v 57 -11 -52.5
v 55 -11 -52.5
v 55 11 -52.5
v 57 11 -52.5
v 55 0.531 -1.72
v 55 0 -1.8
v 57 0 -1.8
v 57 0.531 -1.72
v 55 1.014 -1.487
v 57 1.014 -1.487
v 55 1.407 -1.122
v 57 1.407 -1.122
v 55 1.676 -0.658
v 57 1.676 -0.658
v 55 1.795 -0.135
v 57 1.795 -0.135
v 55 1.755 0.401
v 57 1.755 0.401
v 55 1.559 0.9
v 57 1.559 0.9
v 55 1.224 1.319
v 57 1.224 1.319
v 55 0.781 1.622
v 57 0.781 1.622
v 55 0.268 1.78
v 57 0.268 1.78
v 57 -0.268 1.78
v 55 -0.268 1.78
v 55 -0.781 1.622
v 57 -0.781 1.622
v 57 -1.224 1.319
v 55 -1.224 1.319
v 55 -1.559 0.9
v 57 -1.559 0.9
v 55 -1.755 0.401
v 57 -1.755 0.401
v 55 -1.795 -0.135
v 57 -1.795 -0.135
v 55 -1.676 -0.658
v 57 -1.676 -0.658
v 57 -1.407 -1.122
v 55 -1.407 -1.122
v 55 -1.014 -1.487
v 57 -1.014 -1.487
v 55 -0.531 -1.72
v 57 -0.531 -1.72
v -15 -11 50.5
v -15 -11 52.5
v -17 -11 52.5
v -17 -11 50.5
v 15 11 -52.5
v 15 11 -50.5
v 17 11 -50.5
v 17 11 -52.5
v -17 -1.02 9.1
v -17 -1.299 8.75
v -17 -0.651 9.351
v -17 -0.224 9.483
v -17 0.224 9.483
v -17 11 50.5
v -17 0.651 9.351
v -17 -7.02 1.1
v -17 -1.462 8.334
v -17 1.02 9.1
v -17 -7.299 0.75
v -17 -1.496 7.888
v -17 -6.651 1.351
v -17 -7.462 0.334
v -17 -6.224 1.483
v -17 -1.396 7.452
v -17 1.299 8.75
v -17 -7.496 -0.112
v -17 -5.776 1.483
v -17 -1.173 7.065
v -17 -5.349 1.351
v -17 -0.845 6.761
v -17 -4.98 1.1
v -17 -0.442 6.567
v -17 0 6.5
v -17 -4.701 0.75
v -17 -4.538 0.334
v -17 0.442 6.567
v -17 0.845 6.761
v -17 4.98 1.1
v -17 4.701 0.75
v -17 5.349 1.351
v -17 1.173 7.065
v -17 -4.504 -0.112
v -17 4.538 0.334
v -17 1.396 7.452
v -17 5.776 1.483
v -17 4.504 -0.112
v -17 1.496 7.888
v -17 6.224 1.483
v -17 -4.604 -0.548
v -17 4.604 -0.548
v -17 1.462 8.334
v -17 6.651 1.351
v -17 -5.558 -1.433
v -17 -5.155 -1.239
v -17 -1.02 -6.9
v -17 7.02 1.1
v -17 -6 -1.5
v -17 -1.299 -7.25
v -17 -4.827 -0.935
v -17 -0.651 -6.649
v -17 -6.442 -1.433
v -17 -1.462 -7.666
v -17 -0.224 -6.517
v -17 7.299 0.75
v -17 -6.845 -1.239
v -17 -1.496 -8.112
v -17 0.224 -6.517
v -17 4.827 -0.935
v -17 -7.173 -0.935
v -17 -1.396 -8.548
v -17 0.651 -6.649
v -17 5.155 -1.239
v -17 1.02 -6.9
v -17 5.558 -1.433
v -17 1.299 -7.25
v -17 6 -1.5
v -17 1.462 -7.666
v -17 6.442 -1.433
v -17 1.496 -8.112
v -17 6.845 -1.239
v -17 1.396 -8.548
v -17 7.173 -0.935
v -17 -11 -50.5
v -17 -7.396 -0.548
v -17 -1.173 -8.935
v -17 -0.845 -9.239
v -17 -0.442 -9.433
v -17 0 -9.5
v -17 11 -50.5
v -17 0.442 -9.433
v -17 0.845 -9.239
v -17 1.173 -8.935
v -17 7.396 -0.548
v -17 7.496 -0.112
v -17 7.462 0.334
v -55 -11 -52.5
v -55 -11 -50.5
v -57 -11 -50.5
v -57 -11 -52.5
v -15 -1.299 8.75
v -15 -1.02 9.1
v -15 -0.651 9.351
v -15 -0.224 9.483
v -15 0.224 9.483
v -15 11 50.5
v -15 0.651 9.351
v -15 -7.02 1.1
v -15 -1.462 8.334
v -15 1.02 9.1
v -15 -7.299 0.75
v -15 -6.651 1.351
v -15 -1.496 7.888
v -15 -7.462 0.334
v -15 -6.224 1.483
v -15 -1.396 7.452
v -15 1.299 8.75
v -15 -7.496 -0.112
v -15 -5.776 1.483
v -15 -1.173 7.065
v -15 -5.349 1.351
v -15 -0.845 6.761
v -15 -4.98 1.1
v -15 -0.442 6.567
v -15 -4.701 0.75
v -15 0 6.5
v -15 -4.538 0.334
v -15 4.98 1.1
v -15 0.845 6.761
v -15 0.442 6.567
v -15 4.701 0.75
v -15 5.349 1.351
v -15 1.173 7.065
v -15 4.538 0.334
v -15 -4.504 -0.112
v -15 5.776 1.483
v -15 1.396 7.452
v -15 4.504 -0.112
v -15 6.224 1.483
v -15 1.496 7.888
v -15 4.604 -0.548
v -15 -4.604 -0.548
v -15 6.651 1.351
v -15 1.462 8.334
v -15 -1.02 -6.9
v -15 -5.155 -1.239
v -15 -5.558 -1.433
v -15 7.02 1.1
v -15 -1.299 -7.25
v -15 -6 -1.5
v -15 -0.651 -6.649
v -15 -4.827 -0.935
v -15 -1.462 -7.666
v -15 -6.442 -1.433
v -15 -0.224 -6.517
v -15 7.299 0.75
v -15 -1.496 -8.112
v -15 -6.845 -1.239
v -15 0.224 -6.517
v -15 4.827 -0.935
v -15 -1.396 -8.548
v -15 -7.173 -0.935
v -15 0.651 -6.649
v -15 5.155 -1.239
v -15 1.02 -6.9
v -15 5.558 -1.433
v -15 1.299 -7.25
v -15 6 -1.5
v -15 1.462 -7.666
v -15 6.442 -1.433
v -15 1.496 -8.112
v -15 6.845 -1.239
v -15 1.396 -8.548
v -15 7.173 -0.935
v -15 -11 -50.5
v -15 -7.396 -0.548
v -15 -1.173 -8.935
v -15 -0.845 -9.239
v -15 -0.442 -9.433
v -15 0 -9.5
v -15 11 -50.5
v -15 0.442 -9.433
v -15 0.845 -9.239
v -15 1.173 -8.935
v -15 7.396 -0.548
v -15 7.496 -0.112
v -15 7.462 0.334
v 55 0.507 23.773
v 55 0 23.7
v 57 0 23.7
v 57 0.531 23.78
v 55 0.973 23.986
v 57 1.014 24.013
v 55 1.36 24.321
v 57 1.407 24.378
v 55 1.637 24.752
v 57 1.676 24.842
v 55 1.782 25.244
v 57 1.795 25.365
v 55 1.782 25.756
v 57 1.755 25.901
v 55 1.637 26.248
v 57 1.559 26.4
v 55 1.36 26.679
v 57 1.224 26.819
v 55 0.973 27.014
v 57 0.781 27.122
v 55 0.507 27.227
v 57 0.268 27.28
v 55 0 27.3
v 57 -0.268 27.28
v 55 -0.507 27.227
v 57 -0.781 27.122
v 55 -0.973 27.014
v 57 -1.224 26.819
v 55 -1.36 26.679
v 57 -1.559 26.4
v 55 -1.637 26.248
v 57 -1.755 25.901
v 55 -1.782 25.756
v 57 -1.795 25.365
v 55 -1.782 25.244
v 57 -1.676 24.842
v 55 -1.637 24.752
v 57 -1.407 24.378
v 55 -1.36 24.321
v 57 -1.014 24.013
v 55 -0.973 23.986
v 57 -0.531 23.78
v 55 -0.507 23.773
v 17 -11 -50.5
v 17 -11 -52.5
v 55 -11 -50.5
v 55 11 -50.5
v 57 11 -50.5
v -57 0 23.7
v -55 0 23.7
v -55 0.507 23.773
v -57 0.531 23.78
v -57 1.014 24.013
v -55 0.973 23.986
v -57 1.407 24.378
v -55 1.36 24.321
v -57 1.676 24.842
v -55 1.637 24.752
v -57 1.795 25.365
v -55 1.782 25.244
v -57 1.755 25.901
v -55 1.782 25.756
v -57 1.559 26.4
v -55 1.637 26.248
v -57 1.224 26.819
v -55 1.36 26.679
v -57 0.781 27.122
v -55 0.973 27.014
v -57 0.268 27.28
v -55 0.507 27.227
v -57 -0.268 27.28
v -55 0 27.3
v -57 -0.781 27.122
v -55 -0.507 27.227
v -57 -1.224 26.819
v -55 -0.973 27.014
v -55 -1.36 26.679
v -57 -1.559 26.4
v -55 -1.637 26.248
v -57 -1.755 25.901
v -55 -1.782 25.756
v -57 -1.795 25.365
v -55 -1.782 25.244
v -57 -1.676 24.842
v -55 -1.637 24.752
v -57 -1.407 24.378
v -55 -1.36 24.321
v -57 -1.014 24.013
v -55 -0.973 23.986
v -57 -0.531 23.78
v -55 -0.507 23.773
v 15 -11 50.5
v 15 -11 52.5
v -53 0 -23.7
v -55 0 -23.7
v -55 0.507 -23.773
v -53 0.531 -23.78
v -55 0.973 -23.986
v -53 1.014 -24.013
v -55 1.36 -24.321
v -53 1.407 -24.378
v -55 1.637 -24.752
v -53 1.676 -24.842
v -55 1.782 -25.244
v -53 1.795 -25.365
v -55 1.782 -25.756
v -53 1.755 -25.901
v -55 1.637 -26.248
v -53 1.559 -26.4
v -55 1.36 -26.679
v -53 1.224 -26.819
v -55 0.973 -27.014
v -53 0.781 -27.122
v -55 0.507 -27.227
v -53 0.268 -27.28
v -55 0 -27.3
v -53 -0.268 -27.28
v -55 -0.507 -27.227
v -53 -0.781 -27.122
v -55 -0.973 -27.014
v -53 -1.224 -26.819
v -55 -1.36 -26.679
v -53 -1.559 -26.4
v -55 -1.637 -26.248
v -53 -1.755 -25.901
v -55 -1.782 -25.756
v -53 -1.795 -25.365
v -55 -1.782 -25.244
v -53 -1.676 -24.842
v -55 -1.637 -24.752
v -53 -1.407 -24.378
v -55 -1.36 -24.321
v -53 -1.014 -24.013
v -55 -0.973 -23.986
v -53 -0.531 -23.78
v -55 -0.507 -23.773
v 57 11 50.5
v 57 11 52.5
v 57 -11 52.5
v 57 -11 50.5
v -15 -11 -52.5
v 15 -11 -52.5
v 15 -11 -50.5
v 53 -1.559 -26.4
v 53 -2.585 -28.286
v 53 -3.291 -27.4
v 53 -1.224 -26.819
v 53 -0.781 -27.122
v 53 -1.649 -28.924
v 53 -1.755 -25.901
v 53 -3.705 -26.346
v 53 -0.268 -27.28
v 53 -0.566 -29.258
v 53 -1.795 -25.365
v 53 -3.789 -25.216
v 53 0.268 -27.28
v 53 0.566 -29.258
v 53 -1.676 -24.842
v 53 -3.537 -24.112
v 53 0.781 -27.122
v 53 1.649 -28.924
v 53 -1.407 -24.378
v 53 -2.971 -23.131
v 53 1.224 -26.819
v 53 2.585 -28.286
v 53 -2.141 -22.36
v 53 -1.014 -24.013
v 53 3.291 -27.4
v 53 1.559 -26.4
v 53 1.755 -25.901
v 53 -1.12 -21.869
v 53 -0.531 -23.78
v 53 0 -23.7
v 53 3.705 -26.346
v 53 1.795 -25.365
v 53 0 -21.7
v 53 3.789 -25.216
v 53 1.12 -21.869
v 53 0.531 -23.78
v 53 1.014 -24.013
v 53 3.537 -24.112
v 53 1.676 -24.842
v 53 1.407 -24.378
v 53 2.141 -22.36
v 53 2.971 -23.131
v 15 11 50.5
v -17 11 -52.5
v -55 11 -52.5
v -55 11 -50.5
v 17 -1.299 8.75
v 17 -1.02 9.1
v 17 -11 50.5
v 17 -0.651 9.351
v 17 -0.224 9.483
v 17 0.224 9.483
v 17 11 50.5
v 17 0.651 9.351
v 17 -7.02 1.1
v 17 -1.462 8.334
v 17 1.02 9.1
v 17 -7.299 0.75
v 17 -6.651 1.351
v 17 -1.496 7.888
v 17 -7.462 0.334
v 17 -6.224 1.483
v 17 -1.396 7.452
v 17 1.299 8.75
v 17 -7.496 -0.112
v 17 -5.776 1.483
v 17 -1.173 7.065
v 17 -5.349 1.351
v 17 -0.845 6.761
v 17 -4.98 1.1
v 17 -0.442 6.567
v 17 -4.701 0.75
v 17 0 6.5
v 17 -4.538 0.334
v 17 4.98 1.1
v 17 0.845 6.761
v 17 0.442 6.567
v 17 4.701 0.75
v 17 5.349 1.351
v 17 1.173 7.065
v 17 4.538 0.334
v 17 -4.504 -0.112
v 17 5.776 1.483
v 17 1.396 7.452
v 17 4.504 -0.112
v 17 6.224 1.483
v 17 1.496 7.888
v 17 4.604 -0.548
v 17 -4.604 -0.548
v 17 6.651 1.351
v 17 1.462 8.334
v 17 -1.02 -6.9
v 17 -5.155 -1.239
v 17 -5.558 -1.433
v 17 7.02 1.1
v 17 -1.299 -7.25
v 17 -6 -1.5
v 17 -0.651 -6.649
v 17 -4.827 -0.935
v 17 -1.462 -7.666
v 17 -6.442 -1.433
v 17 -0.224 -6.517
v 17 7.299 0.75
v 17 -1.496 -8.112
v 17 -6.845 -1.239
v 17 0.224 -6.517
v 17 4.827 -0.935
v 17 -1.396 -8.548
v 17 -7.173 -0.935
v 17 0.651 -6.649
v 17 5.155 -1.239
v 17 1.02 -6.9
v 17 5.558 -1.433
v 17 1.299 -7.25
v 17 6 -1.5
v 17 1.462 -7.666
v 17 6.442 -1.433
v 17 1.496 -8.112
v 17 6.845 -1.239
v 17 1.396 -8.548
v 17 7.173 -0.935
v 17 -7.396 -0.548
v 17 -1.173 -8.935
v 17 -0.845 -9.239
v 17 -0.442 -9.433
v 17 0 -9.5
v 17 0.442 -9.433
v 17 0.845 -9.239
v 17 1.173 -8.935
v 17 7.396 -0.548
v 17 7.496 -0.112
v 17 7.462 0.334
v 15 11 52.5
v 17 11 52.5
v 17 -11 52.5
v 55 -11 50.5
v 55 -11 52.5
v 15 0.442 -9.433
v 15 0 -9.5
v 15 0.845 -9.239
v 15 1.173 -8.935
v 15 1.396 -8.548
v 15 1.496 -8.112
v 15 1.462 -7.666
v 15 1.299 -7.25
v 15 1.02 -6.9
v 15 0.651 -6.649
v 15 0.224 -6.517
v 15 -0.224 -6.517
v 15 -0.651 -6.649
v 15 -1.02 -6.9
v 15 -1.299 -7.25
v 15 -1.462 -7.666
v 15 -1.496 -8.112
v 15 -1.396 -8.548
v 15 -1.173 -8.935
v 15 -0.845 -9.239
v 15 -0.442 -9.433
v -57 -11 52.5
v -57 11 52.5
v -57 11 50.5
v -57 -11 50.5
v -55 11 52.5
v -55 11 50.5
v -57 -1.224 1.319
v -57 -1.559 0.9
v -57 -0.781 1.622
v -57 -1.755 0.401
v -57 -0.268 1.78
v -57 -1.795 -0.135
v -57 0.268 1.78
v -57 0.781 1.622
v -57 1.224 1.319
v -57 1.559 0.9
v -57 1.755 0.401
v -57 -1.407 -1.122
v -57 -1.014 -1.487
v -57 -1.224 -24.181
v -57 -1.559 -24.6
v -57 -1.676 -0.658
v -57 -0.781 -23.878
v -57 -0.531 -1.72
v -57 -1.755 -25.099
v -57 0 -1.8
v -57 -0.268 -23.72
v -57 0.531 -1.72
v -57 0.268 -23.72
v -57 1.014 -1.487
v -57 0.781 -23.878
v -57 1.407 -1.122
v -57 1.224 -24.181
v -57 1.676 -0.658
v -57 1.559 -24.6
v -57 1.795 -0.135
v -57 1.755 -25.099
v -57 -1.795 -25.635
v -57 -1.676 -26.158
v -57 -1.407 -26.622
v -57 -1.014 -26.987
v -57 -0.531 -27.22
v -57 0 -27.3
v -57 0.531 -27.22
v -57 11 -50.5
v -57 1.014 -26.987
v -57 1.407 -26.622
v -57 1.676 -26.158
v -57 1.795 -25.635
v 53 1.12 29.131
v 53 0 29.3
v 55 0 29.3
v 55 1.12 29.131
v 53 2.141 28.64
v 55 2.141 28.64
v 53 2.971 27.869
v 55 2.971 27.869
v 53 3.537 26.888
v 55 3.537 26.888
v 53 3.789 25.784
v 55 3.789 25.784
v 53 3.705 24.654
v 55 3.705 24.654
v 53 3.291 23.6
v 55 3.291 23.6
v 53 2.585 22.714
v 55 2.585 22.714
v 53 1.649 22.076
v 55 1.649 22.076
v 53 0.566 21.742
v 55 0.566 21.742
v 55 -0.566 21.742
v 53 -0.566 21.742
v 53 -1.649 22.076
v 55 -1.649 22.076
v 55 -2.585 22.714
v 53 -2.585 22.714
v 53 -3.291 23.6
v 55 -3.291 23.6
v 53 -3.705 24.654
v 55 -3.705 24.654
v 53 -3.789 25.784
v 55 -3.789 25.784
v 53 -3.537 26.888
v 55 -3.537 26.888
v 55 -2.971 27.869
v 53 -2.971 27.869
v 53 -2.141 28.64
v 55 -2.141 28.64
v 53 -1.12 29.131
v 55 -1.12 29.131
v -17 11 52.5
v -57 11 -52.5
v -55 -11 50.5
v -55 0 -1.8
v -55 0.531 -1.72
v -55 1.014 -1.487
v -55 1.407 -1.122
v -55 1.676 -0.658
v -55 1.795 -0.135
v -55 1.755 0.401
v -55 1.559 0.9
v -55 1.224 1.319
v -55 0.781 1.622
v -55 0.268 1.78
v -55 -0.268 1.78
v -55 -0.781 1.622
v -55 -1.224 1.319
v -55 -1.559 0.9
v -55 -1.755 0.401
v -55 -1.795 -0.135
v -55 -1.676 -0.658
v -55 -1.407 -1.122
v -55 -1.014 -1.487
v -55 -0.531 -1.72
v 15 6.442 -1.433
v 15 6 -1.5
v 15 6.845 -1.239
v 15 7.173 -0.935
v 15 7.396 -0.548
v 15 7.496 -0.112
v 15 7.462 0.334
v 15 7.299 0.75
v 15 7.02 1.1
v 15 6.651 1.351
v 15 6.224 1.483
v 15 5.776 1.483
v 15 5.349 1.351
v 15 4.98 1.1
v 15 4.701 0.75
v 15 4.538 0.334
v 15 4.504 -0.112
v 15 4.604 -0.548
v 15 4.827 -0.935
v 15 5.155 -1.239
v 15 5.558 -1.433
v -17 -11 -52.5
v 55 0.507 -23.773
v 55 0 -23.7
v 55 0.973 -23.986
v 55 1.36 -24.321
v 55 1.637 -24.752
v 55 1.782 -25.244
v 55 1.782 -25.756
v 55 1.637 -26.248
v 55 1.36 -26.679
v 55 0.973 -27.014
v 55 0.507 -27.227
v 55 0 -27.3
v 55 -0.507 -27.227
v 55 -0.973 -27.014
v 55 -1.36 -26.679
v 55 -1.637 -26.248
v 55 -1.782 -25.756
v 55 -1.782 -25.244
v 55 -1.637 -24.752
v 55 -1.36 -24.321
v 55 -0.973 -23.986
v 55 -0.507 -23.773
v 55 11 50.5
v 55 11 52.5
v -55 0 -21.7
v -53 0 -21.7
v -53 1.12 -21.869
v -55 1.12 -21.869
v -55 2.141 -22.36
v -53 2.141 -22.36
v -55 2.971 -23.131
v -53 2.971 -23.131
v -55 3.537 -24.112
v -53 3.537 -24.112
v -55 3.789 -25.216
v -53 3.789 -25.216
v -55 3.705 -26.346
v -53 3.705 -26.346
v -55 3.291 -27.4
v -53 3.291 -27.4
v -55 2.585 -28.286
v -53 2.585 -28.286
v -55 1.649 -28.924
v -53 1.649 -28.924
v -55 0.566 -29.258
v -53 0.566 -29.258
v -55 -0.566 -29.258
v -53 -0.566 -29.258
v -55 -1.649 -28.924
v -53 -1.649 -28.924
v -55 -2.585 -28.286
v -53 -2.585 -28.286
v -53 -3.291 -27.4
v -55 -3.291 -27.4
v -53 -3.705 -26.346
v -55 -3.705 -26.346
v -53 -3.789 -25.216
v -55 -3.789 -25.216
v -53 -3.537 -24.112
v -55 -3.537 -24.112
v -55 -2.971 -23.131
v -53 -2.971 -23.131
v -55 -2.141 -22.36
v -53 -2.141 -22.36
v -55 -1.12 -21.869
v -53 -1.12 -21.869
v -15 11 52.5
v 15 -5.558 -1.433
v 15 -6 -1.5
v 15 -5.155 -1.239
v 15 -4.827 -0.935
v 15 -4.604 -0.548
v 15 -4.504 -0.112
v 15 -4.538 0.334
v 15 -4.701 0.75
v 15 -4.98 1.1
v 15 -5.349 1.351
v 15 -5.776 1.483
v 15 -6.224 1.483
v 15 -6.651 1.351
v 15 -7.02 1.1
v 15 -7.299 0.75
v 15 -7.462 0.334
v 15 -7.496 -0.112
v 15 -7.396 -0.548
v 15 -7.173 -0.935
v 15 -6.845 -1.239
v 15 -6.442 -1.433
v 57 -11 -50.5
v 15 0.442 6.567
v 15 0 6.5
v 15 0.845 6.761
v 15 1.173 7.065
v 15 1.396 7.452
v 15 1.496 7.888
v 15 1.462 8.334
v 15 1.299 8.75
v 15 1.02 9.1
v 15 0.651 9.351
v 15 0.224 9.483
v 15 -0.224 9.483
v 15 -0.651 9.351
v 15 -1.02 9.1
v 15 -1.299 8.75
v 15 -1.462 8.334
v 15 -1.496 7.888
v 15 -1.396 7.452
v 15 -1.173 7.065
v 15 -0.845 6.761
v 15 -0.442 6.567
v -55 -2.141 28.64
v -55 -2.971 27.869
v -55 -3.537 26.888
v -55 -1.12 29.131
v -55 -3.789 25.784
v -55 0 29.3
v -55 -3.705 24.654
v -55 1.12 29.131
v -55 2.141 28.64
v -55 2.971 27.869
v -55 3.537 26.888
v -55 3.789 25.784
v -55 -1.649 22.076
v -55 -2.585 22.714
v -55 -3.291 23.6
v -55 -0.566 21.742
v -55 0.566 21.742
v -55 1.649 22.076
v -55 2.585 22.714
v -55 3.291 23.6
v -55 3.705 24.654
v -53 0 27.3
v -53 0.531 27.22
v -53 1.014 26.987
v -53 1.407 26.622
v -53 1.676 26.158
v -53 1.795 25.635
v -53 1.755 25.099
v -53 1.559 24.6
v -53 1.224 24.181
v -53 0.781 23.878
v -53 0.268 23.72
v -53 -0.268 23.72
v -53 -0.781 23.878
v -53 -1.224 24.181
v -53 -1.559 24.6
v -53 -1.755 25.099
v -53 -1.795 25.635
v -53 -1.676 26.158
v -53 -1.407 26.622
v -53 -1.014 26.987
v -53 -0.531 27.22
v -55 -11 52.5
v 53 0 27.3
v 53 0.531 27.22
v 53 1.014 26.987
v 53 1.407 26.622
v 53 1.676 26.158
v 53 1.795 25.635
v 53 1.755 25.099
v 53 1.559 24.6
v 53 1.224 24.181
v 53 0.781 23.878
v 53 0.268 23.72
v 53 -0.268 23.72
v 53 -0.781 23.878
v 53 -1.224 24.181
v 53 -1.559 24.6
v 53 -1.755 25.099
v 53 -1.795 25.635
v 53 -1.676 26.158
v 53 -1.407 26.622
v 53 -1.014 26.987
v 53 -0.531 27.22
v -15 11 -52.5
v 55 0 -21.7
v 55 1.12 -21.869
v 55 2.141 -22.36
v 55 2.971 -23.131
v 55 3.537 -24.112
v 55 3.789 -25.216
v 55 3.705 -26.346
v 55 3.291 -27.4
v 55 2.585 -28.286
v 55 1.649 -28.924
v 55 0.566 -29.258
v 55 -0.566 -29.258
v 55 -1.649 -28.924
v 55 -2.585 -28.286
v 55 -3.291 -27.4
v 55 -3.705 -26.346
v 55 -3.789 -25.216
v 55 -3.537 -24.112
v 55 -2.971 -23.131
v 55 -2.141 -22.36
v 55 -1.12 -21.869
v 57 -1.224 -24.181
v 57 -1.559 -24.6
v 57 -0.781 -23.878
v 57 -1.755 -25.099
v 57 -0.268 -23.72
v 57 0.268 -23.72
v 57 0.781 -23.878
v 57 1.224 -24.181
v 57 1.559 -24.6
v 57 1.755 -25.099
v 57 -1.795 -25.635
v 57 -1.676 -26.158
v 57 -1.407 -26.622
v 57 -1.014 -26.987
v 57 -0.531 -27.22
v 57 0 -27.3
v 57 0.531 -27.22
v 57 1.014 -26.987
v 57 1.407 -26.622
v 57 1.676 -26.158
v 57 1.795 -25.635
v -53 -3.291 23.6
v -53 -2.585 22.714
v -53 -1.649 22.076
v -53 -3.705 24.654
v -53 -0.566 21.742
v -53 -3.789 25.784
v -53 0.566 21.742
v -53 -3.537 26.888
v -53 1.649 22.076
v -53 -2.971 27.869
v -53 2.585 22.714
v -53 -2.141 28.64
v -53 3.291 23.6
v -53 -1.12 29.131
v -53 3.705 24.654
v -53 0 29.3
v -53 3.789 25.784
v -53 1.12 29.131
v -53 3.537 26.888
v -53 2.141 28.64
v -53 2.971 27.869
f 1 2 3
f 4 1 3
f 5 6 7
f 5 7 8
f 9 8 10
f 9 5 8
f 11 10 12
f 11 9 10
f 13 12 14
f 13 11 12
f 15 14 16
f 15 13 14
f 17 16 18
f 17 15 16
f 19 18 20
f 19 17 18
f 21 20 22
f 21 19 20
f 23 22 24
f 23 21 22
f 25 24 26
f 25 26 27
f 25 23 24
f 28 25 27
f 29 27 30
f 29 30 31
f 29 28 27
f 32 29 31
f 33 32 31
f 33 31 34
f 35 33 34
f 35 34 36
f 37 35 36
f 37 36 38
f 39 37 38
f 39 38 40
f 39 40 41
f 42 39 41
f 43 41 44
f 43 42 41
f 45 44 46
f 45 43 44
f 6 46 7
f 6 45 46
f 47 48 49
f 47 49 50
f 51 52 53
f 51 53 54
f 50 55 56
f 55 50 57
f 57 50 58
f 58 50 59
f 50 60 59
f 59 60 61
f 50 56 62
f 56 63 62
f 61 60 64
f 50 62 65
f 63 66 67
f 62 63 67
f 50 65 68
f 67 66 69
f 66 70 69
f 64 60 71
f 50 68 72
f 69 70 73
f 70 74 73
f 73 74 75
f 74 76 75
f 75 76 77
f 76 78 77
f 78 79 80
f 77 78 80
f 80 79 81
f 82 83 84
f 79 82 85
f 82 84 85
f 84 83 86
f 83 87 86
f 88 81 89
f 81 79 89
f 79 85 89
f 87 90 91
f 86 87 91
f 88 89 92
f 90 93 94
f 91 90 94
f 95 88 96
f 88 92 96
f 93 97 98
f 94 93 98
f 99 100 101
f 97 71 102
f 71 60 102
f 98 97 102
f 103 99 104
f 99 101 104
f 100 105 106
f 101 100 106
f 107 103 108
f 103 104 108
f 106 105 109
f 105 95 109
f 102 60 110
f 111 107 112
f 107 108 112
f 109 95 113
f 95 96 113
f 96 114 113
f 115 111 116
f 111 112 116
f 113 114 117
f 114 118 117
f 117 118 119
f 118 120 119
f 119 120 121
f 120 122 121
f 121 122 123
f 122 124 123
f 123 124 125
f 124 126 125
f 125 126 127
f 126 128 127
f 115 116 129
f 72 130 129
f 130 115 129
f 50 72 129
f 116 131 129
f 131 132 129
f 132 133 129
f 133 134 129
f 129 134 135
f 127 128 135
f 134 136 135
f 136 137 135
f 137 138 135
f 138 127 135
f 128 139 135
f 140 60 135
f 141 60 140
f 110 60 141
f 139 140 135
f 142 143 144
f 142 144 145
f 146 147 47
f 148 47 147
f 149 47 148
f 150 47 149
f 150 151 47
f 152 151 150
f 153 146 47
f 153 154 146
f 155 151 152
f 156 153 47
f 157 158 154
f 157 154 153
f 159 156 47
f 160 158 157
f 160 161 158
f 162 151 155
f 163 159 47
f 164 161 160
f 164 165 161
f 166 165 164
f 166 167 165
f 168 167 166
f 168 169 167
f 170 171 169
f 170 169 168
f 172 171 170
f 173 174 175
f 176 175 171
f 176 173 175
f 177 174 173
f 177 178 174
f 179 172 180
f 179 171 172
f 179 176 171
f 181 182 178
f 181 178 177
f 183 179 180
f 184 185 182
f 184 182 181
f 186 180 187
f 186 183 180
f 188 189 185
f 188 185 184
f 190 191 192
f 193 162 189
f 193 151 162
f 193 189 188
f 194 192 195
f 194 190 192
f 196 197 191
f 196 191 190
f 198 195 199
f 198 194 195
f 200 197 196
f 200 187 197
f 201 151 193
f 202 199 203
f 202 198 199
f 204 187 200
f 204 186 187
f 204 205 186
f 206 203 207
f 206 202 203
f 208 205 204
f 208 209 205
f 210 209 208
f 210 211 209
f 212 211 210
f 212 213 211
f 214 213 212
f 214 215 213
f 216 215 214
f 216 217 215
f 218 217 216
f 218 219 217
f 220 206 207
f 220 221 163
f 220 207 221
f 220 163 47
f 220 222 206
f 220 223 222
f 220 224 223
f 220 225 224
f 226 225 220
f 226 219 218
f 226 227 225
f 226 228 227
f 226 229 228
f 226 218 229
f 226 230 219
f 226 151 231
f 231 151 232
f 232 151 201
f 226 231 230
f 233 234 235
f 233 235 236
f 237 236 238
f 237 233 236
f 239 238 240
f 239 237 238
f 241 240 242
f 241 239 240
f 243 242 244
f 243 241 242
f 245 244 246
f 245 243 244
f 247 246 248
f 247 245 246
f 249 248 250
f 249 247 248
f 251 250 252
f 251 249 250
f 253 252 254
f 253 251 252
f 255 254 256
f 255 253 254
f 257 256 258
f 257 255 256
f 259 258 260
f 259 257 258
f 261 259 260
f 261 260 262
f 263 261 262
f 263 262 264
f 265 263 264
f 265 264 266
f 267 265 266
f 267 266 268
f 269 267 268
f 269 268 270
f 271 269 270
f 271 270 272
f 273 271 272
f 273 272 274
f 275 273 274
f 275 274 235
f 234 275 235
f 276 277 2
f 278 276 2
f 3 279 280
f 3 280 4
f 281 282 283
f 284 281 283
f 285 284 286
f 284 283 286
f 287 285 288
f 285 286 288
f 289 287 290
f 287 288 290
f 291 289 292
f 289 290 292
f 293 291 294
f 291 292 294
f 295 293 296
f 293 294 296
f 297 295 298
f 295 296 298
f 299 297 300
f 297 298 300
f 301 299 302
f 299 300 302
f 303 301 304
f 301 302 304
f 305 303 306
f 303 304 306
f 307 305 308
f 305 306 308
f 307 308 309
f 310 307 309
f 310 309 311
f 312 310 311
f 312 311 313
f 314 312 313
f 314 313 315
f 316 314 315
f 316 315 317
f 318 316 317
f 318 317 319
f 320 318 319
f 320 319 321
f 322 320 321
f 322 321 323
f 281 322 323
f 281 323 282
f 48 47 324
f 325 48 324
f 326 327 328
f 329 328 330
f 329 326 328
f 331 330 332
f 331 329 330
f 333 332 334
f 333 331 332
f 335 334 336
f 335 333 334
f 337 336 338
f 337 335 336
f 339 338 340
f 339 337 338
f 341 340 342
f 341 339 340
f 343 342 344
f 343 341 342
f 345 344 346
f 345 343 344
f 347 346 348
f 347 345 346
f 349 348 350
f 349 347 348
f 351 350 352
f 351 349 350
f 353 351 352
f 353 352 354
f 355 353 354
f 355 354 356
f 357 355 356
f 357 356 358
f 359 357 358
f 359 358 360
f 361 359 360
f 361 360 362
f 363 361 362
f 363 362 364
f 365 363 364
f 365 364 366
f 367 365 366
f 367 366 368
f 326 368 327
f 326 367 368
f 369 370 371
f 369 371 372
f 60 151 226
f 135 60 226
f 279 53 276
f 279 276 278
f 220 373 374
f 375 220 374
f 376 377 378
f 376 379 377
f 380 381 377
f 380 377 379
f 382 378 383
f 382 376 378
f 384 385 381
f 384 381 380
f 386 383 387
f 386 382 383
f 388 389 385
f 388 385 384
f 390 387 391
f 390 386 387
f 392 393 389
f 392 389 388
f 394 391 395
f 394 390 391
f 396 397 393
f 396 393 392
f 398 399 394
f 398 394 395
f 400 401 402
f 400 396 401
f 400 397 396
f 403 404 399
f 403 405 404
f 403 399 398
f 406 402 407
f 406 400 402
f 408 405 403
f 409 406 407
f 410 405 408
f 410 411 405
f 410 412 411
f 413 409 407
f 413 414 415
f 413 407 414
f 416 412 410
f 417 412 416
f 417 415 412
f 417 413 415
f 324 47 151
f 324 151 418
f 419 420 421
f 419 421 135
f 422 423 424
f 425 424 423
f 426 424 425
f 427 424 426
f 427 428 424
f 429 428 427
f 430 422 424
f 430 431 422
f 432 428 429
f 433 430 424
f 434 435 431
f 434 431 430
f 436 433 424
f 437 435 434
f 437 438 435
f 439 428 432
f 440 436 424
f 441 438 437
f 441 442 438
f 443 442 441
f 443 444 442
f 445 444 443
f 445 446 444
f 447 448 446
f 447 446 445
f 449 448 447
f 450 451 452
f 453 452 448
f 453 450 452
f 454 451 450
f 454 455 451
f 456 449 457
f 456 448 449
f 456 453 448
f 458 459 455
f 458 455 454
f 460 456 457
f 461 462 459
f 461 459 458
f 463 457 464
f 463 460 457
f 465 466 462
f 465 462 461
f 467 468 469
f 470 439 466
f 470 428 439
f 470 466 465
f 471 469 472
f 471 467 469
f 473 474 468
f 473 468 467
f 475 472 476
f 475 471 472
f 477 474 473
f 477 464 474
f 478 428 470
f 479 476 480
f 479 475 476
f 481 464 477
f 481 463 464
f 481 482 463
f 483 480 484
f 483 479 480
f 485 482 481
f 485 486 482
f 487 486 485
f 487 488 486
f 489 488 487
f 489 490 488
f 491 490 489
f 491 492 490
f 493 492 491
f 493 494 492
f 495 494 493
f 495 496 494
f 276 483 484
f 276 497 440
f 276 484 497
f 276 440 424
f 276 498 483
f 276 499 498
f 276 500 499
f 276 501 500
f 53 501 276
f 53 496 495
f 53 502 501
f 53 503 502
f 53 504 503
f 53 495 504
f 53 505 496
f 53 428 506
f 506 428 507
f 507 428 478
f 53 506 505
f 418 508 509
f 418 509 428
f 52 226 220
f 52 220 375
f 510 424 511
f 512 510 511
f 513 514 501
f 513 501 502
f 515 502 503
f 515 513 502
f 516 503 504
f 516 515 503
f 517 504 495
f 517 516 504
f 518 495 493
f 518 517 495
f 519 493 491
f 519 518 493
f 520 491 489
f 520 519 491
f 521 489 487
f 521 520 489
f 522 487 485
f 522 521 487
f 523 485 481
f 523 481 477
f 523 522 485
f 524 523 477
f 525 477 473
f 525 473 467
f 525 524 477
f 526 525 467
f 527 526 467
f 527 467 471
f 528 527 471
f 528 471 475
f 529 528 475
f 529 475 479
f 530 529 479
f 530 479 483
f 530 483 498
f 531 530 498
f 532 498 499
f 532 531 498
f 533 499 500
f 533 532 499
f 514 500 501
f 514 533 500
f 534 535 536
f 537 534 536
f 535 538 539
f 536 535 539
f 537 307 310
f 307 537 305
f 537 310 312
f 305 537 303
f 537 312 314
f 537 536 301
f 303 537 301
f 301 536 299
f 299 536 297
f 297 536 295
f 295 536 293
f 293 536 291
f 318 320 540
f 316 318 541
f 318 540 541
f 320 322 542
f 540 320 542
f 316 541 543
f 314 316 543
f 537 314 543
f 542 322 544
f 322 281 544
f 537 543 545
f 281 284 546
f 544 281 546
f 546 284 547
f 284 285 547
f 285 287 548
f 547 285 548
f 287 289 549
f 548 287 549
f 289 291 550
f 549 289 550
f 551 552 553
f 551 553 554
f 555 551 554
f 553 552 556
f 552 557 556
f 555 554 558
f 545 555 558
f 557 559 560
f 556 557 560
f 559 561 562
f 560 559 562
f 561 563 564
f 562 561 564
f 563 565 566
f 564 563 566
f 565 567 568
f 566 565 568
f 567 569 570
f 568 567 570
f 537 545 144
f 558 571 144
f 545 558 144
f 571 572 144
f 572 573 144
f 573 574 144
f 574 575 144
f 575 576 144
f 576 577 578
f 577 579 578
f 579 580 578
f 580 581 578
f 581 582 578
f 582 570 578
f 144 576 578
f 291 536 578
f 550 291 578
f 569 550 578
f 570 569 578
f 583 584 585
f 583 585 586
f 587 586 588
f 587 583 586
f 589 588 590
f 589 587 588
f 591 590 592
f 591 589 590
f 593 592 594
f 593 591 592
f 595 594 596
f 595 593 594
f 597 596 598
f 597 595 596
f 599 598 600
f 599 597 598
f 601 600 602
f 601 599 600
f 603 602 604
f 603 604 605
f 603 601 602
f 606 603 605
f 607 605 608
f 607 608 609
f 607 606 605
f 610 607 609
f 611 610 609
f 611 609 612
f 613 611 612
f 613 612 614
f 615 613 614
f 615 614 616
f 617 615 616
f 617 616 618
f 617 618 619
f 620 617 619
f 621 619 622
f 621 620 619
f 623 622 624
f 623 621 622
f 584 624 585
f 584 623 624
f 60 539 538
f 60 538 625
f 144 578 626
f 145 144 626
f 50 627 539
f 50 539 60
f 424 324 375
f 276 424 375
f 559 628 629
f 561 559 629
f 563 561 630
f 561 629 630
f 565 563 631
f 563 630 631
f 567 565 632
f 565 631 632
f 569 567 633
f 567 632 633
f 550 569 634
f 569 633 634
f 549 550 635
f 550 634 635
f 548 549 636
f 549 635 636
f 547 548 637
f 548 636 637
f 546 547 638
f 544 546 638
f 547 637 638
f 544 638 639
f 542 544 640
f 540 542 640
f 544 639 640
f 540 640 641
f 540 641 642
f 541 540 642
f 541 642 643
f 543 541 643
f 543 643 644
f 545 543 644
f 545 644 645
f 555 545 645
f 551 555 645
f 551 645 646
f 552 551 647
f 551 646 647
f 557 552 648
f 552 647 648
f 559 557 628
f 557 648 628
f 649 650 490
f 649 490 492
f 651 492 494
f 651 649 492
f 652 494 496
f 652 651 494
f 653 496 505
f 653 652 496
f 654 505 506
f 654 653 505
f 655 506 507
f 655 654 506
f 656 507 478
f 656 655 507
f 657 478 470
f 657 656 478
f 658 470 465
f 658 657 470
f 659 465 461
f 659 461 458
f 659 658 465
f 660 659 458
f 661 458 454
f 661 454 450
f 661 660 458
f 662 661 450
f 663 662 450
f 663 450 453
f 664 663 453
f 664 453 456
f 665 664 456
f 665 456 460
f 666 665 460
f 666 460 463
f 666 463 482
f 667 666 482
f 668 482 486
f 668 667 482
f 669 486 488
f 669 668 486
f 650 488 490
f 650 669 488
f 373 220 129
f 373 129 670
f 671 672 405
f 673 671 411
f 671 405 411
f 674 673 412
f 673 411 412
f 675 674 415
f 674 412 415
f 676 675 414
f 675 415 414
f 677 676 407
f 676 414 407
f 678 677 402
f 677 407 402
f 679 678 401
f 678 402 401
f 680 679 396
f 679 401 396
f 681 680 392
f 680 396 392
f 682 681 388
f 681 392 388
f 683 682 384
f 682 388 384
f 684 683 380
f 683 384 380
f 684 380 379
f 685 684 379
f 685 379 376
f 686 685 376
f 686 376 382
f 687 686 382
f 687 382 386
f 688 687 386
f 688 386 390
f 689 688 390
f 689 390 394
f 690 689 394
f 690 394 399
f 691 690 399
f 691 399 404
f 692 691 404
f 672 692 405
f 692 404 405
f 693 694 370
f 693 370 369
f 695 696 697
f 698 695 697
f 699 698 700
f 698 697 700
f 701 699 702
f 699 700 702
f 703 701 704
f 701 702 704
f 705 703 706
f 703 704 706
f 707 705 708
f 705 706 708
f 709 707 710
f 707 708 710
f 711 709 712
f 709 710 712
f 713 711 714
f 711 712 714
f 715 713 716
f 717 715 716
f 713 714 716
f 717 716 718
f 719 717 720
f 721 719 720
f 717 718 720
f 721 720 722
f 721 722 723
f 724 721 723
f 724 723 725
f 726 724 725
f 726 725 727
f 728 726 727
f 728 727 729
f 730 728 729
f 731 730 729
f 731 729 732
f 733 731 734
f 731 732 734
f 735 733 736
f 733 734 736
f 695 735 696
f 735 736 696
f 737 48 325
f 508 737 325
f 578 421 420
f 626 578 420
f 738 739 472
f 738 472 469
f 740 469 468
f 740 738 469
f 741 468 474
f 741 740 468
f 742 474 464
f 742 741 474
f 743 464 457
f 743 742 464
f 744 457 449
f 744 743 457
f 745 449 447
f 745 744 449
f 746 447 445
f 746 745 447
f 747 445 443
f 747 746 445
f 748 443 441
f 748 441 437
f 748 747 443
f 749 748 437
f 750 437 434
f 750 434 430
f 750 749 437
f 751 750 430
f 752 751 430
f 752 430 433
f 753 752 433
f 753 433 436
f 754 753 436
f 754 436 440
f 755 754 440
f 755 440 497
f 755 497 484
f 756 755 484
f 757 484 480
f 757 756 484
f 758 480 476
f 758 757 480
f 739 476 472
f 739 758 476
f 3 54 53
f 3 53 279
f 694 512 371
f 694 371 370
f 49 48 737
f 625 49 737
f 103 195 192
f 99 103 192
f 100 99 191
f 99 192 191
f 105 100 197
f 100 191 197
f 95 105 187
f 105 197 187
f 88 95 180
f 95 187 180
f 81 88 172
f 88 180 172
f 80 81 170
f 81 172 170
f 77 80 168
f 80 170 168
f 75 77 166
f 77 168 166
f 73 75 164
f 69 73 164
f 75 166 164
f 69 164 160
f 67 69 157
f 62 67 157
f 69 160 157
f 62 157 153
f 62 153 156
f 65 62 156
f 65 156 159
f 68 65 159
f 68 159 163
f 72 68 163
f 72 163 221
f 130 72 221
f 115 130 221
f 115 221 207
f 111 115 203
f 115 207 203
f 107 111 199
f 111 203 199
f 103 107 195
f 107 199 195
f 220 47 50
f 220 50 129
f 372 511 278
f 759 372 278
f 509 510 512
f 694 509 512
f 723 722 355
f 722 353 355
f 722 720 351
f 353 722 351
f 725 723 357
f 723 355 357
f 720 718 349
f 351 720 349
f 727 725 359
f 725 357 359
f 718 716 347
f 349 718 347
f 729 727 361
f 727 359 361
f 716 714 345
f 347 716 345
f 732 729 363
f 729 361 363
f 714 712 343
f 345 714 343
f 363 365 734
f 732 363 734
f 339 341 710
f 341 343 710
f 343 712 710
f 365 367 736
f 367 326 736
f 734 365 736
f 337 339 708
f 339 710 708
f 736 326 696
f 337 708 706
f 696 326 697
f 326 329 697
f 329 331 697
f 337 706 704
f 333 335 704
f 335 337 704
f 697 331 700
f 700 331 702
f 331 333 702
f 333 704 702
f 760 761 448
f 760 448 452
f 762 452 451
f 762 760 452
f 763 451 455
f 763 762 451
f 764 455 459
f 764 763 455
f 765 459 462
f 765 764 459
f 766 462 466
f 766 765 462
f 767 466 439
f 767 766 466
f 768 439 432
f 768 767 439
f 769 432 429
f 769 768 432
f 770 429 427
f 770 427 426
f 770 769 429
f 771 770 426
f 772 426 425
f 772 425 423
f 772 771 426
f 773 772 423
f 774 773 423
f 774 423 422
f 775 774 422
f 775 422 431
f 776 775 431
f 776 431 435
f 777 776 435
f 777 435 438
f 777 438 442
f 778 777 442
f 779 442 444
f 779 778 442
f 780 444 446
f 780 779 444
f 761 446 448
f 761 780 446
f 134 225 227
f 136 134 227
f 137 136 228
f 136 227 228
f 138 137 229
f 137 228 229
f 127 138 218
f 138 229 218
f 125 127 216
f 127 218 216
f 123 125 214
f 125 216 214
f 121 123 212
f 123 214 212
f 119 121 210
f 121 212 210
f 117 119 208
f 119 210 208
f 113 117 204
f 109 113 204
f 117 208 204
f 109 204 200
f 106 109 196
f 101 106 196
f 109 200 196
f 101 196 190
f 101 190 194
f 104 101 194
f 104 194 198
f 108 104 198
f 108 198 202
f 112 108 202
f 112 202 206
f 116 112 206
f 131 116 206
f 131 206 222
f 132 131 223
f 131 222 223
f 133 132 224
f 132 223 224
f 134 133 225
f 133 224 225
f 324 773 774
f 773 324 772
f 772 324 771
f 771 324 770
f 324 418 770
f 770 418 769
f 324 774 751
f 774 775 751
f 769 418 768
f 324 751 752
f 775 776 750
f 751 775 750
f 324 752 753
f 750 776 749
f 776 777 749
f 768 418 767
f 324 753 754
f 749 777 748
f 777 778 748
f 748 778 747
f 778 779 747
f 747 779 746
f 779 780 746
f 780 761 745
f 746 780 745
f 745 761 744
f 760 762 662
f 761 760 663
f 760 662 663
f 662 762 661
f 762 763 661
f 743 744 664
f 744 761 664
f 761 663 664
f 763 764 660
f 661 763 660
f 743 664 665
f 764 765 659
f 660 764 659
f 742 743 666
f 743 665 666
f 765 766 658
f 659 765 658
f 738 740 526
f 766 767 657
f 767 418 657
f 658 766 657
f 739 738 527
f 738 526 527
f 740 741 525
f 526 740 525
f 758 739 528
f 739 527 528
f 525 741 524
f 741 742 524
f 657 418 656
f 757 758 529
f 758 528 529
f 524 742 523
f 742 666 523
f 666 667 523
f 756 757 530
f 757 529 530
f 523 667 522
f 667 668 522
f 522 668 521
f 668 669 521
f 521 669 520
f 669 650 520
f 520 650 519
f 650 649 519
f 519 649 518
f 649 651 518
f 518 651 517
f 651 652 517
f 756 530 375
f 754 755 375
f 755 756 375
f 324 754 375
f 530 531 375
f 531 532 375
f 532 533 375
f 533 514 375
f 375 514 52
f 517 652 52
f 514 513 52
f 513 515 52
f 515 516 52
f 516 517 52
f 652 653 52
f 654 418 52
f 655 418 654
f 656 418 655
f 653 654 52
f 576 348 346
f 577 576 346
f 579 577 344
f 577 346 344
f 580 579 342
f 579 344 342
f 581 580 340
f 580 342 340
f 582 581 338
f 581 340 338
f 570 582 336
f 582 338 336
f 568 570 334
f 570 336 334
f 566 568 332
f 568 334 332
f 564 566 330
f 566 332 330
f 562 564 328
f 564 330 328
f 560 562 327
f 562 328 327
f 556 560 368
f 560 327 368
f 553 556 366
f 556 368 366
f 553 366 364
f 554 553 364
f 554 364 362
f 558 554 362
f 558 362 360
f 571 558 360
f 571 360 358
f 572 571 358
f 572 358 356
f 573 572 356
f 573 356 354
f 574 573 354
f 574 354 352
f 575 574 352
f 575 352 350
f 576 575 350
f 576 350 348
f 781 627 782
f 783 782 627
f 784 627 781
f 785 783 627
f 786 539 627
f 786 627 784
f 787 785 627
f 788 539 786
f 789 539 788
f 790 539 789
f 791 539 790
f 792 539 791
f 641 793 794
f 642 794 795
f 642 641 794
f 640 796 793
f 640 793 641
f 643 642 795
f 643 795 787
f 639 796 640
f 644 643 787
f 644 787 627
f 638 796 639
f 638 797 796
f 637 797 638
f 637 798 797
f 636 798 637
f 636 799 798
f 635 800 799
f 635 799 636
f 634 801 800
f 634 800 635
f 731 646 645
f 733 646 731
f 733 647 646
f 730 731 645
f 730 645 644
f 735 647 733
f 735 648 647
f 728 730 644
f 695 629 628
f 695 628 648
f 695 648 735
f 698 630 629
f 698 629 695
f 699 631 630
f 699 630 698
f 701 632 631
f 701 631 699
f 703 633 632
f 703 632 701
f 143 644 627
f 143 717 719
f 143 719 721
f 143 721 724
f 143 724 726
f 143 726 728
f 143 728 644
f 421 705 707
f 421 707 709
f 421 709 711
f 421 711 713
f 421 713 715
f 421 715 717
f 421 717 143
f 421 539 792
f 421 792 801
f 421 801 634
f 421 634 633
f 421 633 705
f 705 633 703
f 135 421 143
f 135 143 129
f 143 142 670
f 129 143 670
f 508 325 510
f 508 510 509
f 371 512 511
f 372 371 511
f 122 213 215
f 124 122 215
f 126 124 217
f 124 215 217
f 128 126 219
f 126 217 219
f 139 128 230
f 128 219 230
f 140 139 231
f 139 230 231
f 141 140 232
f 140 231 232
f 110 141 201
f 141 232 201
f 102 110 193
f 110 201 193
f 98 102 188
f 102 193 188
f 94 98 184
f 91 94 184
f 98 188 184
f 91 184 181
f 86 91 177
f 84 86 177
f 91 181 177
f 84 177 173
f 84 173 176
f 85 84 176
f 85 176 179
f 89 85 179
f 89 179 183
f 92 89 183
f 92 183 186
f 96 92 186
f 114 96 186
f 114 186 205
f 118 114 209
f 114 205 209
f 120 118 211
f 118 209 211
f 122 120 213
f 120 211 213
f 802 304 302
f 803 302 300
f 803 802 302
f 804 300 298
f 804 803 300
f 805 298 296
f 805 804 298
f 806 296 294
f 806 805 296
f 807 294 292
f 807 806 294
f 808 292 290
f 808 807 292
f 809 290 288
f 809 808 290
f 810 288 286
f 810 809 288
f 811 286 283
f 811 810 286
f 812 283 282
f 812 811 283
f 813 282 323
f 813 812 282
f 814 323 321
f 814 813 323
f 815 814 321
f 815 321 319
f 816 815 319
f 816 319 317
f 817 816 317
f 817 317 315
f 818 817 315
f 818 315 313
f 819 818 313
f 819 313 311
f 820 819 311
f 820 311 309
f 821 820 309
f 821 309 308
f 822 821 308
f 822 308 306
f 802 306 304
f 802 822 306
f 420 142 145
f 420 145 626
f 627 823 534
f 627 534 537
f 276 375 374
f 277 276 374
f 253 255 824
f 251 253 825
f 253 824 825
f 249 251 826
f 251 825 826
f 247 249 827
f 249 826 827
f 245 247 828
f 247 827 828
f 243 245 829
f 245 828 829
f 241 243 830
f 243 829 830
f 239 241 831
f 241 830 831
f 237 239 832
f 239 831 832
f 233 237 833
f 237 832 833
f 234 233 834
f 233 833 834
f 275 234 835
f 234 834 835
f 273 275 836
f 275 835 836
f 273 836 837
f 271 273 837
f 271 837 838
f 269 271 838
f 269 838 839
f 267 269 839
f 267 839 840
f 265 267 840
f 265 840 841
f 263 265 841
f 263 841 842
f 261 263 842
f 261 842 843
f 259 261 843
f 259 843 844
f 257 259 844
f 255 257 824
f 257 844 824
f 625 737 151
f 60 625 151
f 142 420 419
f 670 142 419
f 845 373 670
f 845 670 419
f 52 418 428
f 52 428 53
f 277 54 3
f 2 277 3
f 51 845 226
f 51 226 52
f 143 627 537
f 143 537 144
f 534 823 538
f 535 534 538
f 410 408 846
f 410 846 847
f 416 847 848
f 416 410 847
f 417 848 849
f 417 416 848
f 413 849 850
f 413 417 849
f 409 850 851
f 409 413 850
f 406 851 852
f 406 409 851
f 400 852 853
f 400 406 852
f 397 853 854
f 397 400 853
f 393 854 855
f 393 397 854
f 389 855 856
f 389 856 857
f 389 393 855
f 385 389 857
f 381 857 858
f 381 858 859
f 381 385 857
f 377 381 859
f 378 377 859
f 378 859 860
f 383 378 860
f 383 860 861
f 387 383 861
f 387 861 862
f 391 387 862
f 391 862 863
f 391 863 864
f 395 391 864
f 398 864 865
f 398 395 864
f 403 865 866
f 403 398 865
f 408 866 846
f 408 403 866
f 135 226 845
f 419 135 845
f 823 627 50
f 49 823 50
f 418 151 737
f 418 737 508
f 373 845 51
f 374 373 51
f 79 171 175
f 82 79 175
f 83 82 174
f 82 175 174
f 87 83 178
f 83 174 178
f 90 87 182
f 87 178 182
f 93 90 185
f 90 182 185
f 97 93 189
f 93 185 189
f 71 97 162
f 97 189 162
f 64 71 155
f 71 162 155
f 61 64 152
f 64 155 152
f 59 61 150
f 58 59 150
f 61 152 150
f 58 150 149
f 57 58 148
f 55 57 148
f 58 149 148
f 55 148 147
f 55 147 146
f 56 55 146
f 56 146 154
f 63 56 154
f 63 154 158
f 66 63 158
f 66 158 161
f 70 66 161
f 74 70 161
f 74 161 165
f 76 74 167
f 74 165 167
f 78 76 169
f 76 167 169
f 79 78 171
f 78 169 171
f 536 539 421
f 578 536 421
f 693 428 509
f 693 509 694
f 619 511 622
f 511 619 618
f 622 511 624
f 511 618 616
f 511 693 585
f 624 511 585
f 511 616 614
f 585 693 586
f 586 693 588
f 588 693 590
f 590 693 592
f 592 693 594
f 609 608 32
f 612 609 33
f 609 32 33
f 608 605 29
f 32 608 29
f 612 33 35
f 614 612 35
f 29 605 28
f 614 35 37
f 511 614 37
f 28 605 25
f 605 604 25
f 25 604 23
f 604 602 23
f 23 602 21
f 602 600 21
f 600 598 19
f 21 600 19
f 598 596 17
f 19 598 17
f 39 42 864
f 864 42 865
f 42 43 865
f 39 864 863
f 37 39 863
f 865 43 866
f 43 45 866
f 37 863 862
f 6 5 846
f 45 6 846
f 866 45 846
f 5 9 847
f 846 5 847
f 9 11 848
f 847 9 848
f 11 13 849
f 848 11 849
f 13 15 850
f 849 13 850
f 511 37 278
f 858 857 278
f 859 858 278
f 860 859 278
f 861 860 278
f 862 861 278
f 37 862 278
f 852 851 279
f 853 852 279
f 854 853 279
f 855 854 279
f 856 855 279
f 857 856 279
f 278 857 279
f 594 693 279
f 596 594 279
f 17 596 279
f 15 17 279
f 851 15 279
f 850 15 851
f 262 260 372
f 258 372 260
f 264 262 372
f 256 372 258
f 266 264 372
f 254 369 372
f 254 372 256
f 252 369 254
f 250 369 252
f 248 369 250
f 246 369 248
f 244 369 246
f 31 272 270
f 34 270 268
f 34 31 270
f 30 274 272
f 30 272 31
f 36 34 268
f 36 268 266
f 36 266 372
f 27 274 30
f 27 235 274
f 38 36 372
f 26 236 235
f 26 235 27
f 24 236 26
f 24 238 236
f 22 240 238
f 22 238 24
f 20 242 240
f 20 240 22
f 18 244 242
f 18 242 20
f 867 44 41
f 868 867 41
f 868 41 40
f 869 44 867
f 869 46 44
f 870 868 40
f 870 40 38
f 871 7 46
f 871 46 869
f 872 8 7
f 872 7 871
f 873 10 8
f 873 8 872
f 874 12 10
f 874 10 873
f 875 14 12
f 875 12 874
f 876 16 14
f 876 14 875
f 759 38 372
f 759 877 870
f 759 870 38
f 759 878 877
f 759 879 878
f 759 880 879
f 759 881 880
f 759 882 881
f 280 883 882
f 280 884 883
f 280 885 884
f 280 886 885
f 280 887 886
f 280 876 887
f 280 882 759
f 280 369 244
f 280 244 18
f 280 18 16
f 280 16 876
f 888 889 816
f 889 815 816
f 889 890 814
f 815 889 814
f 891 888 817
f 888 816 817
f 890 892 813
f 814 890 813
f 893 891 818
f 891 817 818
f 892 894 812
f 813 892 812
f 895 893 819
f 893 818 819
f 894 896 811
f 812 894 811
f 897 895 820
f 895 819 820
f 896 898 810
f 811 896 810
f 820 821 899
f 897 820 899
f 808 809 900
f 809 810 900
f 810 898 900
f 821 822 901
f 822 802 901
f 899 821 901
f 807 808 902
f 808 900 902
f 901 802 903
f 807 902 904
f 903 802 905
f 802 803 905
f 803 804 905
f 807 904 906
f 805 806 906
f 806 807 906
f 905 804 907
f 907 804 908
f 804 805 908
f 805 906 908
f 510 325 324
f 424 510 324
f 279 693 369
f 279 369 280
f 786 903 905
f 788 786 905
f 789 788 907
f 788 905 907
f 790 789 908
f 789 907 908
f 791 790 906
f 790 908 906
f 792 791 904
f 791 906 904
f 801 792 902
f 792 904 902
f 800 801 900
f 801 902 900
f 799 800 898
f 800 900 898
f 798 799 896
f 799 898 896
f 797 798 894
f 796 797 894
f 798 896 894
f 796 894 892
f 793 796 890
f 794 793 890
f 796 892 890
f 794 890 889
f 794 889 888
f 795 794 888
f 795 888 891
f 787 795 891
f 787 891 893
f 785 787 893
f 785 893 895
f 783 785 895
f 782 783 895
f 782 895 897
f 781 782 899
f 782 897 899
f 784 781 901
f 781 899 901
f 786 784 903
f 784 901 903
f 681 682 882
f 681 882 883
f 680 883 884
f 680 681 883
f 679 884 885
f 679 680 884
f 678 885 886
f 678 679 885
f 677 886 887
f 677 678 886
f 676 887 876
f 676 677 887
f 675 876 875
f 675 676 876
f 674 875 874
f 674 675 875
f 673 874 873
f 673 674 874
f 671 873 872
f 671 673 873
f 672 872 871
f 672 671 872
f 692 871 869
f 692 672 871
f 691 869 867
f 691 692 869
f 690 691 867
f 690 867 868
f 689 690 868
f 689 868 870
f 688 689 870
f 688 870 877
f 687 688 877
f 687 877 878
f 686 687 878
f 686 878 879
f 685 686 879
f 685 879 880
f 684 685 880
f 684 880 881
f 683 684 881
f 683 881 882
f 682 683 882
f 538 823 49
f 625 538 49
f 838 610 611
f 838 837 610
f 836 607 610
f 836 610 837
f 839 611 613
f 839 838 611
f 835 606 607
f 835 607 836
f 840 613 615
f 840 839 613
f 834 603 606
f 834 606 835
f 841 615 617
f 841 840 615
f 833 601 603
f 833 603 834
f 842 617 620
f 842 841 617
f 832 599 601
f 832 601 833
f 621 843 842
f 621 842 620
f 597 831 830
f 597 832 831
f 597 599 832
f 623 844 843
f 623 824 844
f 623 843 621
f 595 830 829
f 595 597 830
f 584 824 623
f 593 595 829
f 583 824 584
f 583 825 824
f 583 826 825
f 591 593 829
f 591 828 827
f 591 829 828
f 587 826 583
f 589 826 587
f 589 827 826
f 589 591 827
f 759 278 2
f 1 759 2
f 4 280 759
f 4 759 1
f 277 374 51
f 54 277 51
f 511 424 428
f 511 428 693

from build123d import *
from build123d.topology import SkipClean

# Parameters (mm, degrees)
BOSS_EXTRUDE1_START = 55
SKETCH2_W           = 105
SKETCH2_H           = 22
SKETCH2_R           = 1.8
BOSS_EXTRUDE1_DEPTH = 2
BOSS_EXTRUDE2_START = 2
SKETCH3_R           = 3.8
SKETCH3_R_2         = 1.8
BOSS_EXTRUDE2_DEPTH = 2
BOSS_EXTRUDE3_START = 15
SKETCH5_W           = 105
SKETCH5_H           = 22
SKETCH5_R           = 1.5
BOSS_EXTRUDE3_DEPTH = 2
SKETCH6_W           = 114
SKETCH6_H           = 2
BOSS_EXTRUDE4_DEPTH = 11


with BuildPart() as part:
    # Sketch2 → Boss-Extrude1 (new body)
    with BuildSketch(Plane(origin=(0, 0, 0), x_dir=(0, 0, -1), z_dir=(1, 0, 0)).offset(BOSS_EXTRUDE1_START)):
        Rectangle(SKETCH2_W, SKETCH2_H)
        Circle(SKETCH2_R, mode=Mode.SUBTRACT)
        with Locations((-25.5, 0)):
            Circle(SKETCH2_R, mode=Mode.SUBTRACT)
        with Locations((25.5, 0)):
            Circle(SKETCH2_R, mode=Mode.SUBTRACT)
    extrude(amount=BOSS_EXTRUDE1_DEPTH)

    # Sketch3 → Boss-Extrude2 (add)
    # profile 1 of 2: a face of its own
    with SkipClean():  # the faces are left unmerged after this step: merging them gives an invalid solid
        with BuildSketch(Plane.ZY.offset(-55).offset(BOSS_EXTRUDE2_START)):
            with Locations((-25.5, 0)):
                Circle(SKETCH3_R)
            with Locations((-25.5, 0)):
                Circle(SKETCH3_R_2, mode=Mode.SUBTRACT)
        # profile 2 of 2: a face of its own
        with BuildSketch(Plane.ZY.offset(-55).offset(BOSS_EXTRUDE2_START)):
            with Locations((25.5, 0)):
                Circle(SKETCH3_R)
            with Locations((25.5, 0)):
                Circle(SKETCH3_R_2, mode=Mode.SUBTRACT)
        extrude(amount=-BOSS_EXTRUDE2_DEPTH)


with BuildPart() as body_2:
    # Sketch5 → Boss-Extrude3 (new body)
    with BuildSketch(Plane(origin=(0, 0, 0), x_dir=(0, 0, -1), z_dir=(1, 0, 0)).offset(BOSS_EXTRUDE3_START)):
        Rectangle(SKETCH5_W, SKETCH5_H)
        with Locations((8, 0)):
            Circle(SKETCH5_R, mode=Mode.SUBTRACT)
        with Locations((-8, 0)):
            Circle(SKETCH5_R, mode=Mode.SUBTRACT)
        with Locations((0, 6)):
            Circle(SKETCH5_R, mode=Mode.SUBTRACT)
        with Locations((0, -6)):
            Circle(SKETCH5_R, mode=Mode.SUBTRACT)
    extrude(amount=BOSS_EXTRUDE3_DEPTH)


with BuildPart() as body_3:
    # Mirror2: mirrored copy
    add(part.part.mirror(Plane(origin=(0, 0, 0), x_dir=(0, 0, 1), z_dir=(1, 0, 0))))


with BuildPart() as body_4:
    # Mirror2 2: mirrored copy
    add(body_2.part.mirror(Plane(origin=(0, 0, 0), x_dir=(0, 0, 1), z_dir=(1, 0, 0))))


with BuildPart() as part_1:
    with SkipClean():  # the faces are left unmerged after this step: merging them gives an invalid solid
        add(part.part)

        add(body_2.part)  # Boss-Extrude4 merges body 2

        add(body_3.part)  # Boss-Extrude4 merges body 3

        add(body_4.part)  # Boss-Extrude4 merges body 4
        # Sketch6 → Boss-Extrude4 (add, symmetric)
        with BuildSketch(Plane(origin=(0, 0, 0), x_dir=(1, 0, 0), z_dir=(0, 1, 0))):
            with Locations((0, -51.5)):
                Rectangle(SKETCH6_W, SKETCH6_H)
            with Locations((0, 51.5)):
                Rectangle(SKETCH6_W, SKETCH6_H)
        extrude(amount=BOSS_EXTRUDE4_DEPTH, both=True)


solid = part_1.part
